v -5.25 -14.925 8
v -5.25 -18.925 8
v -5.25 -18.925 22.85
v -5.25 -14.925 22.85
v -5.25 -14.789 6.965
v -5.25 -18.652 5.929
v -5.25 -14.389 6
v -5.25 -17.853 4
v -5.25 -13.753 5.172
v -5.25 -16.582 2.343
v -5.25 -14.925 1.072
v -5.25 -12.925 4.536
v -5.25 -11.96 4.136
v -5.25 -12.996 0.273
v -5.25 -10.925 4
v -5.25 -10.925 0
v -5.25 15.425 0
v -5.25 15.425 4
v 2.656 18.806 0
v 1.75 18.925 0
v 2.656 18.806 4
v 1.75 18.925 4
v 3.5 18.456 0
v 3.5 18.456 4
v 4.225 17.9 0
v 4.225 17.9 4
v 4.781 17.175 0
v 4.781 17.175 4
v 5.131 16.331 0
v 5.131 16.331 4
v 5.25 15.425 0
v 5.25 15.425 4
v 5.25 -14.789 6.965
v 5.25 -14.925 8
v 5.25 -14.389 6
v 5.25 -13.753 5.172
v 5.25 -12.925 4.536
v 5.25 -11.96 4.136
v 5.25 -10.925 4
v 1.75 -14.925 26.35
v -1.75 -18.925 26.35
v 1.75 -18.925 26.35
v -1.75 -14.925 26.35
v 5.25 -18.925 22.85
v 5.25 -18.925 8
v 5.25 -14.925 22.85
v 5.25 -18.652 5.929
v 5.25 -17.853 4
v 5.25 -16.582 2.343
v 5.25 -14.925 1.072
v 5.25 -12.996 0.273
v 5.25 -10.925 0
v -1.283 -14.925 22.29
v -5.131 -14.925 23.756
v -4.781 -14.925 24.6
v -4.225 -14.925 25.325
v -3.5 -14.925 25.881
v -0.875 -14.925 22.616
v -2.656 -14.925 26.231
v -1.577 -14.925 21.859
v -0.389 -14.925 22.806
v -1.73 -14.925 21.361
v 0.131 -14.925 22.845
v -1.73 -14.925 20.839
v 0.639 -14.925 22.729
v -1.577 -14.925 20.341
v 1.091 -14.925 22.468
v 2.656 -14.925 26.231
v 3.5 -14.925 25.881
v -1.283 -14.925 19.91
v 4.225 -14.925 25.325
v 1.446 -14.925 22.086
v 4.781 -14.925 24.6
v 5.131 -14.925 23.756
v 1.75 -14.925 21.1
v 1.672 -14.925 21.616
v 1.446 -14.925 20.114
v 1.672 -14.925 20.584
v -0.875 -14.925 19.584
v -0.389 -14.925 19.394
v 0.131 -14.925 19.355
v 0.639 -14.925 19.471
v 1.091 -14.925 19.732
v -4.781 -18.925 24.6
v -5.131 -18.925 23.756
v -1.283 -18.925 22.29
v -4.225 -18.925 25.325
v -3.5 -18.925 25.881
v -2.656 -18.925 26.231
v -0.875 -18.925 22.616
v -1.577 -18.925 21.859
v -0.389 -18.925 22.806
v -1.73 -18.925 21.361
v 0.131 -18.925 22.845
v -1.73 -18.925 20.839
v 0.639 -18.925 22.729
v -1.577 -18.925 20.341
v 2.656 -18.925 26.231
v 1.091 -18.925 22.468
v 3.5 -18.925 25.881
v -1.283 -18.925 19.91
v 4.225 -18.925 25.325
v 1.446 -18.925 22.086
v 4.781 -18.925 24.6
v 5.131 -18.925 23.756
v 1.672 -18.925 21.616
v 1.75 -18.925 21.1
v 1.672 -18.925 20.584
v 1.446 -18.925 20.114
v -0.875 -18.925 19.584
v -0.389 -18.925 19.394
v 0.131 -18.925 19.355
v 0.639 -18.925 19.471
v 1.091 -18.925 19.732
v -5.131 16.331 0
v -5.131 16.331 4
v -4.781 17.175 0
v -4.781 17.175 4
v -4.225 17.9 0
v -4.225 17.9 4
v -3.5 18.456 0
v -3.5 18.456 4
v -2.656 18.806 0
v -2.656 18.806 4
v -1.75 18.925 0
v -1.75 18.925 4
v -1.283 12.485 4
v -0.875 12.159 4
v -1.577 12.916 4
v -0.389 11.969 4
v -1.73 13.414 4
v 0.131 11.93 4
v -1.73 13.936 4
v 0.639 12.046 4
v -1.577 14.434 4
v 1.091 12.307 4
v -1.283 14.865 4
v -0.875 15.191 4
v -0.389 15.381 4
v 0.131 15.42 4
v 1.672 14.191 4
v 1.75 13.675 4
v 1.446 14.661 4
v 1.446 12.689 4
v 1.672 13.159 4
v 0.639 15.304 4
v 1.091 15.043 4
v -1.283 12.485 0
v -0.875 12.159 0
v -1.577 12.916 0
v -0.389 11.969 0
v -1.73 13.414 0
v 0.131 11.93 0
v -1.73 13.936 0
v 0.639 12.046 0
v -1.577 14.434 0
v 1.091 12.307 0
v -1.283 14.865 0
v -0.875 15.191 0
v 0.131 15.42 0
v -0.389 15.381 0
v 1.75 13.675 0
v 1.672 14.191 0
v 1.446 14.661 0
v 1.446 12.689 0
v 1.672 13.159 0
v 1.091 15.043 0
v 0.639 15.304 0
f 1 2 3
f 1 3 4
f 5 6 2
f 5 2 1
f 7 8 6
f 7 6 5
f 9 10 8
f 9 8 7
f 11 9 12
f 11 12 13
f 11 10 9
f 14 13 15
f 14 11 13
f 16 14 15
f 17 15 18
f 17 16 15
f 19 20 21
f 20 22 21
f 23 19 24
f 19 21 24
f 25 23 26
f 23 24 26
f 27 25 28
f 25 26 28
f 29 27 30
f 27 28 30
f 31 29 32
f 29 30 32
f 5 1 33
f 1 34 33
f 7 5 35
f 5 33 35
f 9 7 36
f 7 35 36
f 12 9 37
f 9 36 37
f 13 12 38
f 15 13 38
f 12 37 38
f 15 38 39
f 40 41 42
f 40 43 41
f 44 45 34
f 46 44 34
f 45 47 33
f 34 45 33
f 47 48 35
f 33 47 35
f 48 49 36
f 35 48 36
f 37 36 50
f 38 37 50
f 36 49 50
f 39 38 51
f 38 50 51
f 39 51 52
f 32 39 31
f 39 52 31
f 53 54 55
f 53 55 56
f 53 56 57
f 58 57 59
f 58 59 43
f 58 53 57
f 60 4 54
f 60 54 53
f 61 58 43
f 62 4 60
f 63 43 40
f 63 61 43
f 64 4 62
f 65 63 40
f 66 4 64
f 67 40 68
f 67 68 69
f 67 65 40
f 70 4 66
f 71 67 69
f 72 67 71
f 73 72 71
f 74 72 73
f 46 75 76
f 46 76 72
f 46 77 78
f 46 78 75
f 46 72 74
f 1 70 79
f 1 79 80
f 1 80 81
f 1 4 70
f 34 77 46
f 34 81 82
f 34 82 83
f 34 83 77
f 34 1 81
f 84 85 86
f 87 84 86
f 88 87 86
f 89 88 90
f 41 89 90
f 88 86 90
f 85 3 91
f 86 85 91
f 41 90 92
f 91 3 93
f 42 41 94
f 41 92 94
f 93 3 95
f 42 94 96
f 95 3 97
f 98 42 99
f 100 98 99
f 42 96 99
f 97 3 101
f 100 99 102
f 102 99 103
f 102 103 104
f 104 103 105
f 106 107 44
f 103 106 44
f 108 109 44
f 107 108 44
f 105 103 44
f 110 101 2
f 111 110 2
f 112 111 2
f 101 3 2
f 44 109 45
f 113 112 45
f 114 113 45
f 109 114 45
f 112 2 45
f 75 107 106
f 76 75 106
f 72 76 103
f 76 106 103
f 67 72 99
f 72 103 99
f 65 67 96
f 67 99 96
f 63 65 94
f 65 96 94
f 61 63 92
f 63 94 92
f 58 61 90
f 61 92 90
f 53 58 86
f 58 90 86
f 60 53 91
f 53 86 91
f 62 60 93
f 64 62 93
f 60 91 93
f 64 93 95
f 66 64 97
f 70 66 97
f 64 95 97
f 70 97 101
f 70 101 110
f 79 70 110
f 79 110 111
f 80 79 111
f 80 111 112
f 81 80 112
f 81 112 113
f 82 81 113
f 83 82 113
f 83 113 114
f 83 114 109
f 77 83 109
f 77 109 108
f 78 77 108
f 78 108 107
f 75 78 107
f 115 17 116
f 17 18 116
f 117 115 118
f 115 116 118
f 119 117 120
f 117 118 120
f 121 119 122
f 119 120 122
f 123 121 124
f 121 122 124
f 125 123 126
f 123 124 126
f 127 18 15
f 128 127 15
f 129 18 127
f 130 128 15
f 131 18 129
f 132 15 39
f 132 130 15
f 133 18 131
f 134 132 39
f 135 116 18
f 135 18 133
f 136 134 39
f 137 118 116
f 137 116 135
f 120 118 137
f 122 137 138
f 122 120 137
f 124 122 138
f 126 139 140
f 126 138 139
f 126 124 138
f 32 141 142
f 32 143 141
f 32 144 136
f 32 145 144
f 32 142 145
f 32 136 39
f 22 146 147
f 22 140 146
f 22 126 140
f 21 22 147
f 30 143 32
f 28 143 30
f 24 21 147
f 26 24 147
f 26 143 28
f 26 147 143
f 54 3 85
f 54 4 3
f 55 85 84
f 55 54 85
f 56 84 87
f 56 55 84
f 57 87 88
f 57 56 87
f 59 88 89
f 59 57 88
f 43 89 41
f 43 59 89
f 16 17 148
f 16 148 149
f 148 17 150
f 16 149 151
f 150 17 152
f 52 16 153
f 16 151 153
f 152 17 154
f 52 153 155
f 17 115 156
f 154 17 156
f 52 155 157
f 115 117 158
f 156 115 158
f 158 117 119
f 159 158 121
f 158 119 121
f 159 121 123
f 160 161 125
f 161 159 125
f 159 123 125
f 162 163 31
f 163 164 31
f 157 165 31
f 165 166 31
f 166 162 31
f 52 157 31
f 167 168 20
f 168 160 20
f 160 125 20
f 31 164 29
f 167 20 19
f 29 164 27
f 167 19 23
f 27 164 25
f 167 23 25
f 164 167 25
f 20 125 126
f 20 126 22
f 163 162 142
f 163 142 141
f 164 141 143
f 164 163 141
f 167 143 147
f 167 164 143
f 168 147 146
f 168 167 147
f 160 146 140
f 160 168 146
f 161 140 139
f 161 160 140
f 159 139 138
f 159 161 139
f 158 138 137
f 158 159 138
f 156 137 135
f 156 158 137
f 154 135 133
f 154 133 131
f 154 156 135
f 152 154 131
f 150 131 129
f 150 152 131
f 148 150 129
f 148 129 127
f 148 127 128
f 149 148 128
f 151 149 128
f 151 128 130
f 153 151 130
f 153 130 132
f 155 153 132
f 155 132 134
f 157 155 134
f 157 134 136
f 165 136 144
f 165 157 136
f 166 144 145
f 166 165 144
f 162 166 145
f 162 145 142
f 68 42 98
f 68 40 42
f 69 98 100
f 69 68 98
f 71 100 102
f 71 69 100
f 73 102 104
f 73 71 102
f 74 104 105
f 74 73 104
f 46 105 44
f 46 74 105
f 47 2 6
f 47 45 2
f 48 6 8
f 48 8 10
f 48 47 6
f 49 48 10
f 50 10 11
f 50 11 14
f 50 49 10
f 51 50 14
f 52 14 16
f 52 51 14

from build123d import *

# Parameters (mm, degrees)
ESQUISSE1_W             = 10.5
ESQUISSE1_H             = 37.85
ESQUISSE1_R             = 1.75
BOSS_EXTRU_1_DEPTH      = 4
ESQUISSE2_W             = 10.5
ESQUISSE2_H             = 4
BOSS_EXTRU_2_DEPTH      = 22.35
ENL_V_MAT_EXTRU_1_REACH = 39.85
ESQUISSE3_R             = 1.75
CONG_1_R                = 3.5
CONG_2_R                = 4
CONG_3_R                = 8


with BuildPart() as part:
    # Esquisse1 → Boss.-Extru.1 (new body)
    with BuildSketch(Plane.XY):
        Rectangle(ESQUISSE1_W, ESQUISSE1_H)
        with Locations((0, 13.675)):
            Circle(ESQUISSE1_R, mode=Mode.SUBTRACT)
    extrude(amount=BOSS_EXTRU_1_DEPTH)

    # Esquisse2 → Boss.-Extru.2 (add)
    with BuildSketch(Plane.XY.offset(4)):
        with Locations((0, -16.925)):
            Rectangle(ESQUISSE2_W, ESQUISSE2_H)
    extrude(amount=BOSS_EXTRU_2_DEPTH)

    # Esquisse3 → Enlèv. mat.-Extru.1 (cut, up to next)
    with BuildSketch(Plane.XZ.offset(18.925), mode=Mode.PRIVATE) as enl_v_mat_extru_1_sk1:
        with Locations((0, 21.1)):
            Circle(ESQUISSE3_R)
    enl_v_mat_extru_1_tool1 = extrude(enl_v_mat_extru_1_sk1.sketch, amount=-ENL_V_MAT_EXTRU_1_REACH, mode=Mode.PRIVATE) & part.part
    add(enl_v_mat_extru_1_tool1.solids().sort_by_distance((0, -18.925, 21.1))[0], mode=Mode.SUBTRACT)

    # Congé1
    cong_1_edges = [part.edges().sort_by_distance(p)[0] for p in [
        (-5.25, -16.925, 26.35),
        (5.25, -16.925, 26.35),
        (-5.25, 18.925, 2),
        (5.25, 18.925, 2),
    ]]
    fillet(cong_1_edges, radius=CONG_1_R)

    # Congé2
    cong_2_edges = [part.edges().sort_by_distance(p)[0] for p in [
        (0, -14.925, 4),
    ]]
    fillet(cong_2_edges, radius=CONG_2_R)

    # Congé3
    cong_3_edges = [part.edges().sort_by_distance(p)[0] for p in [
        (0, -18.925, 0),
    ]]
    fillet(cong_3_edges, radius=CONG_3_R)


solid = part.part
